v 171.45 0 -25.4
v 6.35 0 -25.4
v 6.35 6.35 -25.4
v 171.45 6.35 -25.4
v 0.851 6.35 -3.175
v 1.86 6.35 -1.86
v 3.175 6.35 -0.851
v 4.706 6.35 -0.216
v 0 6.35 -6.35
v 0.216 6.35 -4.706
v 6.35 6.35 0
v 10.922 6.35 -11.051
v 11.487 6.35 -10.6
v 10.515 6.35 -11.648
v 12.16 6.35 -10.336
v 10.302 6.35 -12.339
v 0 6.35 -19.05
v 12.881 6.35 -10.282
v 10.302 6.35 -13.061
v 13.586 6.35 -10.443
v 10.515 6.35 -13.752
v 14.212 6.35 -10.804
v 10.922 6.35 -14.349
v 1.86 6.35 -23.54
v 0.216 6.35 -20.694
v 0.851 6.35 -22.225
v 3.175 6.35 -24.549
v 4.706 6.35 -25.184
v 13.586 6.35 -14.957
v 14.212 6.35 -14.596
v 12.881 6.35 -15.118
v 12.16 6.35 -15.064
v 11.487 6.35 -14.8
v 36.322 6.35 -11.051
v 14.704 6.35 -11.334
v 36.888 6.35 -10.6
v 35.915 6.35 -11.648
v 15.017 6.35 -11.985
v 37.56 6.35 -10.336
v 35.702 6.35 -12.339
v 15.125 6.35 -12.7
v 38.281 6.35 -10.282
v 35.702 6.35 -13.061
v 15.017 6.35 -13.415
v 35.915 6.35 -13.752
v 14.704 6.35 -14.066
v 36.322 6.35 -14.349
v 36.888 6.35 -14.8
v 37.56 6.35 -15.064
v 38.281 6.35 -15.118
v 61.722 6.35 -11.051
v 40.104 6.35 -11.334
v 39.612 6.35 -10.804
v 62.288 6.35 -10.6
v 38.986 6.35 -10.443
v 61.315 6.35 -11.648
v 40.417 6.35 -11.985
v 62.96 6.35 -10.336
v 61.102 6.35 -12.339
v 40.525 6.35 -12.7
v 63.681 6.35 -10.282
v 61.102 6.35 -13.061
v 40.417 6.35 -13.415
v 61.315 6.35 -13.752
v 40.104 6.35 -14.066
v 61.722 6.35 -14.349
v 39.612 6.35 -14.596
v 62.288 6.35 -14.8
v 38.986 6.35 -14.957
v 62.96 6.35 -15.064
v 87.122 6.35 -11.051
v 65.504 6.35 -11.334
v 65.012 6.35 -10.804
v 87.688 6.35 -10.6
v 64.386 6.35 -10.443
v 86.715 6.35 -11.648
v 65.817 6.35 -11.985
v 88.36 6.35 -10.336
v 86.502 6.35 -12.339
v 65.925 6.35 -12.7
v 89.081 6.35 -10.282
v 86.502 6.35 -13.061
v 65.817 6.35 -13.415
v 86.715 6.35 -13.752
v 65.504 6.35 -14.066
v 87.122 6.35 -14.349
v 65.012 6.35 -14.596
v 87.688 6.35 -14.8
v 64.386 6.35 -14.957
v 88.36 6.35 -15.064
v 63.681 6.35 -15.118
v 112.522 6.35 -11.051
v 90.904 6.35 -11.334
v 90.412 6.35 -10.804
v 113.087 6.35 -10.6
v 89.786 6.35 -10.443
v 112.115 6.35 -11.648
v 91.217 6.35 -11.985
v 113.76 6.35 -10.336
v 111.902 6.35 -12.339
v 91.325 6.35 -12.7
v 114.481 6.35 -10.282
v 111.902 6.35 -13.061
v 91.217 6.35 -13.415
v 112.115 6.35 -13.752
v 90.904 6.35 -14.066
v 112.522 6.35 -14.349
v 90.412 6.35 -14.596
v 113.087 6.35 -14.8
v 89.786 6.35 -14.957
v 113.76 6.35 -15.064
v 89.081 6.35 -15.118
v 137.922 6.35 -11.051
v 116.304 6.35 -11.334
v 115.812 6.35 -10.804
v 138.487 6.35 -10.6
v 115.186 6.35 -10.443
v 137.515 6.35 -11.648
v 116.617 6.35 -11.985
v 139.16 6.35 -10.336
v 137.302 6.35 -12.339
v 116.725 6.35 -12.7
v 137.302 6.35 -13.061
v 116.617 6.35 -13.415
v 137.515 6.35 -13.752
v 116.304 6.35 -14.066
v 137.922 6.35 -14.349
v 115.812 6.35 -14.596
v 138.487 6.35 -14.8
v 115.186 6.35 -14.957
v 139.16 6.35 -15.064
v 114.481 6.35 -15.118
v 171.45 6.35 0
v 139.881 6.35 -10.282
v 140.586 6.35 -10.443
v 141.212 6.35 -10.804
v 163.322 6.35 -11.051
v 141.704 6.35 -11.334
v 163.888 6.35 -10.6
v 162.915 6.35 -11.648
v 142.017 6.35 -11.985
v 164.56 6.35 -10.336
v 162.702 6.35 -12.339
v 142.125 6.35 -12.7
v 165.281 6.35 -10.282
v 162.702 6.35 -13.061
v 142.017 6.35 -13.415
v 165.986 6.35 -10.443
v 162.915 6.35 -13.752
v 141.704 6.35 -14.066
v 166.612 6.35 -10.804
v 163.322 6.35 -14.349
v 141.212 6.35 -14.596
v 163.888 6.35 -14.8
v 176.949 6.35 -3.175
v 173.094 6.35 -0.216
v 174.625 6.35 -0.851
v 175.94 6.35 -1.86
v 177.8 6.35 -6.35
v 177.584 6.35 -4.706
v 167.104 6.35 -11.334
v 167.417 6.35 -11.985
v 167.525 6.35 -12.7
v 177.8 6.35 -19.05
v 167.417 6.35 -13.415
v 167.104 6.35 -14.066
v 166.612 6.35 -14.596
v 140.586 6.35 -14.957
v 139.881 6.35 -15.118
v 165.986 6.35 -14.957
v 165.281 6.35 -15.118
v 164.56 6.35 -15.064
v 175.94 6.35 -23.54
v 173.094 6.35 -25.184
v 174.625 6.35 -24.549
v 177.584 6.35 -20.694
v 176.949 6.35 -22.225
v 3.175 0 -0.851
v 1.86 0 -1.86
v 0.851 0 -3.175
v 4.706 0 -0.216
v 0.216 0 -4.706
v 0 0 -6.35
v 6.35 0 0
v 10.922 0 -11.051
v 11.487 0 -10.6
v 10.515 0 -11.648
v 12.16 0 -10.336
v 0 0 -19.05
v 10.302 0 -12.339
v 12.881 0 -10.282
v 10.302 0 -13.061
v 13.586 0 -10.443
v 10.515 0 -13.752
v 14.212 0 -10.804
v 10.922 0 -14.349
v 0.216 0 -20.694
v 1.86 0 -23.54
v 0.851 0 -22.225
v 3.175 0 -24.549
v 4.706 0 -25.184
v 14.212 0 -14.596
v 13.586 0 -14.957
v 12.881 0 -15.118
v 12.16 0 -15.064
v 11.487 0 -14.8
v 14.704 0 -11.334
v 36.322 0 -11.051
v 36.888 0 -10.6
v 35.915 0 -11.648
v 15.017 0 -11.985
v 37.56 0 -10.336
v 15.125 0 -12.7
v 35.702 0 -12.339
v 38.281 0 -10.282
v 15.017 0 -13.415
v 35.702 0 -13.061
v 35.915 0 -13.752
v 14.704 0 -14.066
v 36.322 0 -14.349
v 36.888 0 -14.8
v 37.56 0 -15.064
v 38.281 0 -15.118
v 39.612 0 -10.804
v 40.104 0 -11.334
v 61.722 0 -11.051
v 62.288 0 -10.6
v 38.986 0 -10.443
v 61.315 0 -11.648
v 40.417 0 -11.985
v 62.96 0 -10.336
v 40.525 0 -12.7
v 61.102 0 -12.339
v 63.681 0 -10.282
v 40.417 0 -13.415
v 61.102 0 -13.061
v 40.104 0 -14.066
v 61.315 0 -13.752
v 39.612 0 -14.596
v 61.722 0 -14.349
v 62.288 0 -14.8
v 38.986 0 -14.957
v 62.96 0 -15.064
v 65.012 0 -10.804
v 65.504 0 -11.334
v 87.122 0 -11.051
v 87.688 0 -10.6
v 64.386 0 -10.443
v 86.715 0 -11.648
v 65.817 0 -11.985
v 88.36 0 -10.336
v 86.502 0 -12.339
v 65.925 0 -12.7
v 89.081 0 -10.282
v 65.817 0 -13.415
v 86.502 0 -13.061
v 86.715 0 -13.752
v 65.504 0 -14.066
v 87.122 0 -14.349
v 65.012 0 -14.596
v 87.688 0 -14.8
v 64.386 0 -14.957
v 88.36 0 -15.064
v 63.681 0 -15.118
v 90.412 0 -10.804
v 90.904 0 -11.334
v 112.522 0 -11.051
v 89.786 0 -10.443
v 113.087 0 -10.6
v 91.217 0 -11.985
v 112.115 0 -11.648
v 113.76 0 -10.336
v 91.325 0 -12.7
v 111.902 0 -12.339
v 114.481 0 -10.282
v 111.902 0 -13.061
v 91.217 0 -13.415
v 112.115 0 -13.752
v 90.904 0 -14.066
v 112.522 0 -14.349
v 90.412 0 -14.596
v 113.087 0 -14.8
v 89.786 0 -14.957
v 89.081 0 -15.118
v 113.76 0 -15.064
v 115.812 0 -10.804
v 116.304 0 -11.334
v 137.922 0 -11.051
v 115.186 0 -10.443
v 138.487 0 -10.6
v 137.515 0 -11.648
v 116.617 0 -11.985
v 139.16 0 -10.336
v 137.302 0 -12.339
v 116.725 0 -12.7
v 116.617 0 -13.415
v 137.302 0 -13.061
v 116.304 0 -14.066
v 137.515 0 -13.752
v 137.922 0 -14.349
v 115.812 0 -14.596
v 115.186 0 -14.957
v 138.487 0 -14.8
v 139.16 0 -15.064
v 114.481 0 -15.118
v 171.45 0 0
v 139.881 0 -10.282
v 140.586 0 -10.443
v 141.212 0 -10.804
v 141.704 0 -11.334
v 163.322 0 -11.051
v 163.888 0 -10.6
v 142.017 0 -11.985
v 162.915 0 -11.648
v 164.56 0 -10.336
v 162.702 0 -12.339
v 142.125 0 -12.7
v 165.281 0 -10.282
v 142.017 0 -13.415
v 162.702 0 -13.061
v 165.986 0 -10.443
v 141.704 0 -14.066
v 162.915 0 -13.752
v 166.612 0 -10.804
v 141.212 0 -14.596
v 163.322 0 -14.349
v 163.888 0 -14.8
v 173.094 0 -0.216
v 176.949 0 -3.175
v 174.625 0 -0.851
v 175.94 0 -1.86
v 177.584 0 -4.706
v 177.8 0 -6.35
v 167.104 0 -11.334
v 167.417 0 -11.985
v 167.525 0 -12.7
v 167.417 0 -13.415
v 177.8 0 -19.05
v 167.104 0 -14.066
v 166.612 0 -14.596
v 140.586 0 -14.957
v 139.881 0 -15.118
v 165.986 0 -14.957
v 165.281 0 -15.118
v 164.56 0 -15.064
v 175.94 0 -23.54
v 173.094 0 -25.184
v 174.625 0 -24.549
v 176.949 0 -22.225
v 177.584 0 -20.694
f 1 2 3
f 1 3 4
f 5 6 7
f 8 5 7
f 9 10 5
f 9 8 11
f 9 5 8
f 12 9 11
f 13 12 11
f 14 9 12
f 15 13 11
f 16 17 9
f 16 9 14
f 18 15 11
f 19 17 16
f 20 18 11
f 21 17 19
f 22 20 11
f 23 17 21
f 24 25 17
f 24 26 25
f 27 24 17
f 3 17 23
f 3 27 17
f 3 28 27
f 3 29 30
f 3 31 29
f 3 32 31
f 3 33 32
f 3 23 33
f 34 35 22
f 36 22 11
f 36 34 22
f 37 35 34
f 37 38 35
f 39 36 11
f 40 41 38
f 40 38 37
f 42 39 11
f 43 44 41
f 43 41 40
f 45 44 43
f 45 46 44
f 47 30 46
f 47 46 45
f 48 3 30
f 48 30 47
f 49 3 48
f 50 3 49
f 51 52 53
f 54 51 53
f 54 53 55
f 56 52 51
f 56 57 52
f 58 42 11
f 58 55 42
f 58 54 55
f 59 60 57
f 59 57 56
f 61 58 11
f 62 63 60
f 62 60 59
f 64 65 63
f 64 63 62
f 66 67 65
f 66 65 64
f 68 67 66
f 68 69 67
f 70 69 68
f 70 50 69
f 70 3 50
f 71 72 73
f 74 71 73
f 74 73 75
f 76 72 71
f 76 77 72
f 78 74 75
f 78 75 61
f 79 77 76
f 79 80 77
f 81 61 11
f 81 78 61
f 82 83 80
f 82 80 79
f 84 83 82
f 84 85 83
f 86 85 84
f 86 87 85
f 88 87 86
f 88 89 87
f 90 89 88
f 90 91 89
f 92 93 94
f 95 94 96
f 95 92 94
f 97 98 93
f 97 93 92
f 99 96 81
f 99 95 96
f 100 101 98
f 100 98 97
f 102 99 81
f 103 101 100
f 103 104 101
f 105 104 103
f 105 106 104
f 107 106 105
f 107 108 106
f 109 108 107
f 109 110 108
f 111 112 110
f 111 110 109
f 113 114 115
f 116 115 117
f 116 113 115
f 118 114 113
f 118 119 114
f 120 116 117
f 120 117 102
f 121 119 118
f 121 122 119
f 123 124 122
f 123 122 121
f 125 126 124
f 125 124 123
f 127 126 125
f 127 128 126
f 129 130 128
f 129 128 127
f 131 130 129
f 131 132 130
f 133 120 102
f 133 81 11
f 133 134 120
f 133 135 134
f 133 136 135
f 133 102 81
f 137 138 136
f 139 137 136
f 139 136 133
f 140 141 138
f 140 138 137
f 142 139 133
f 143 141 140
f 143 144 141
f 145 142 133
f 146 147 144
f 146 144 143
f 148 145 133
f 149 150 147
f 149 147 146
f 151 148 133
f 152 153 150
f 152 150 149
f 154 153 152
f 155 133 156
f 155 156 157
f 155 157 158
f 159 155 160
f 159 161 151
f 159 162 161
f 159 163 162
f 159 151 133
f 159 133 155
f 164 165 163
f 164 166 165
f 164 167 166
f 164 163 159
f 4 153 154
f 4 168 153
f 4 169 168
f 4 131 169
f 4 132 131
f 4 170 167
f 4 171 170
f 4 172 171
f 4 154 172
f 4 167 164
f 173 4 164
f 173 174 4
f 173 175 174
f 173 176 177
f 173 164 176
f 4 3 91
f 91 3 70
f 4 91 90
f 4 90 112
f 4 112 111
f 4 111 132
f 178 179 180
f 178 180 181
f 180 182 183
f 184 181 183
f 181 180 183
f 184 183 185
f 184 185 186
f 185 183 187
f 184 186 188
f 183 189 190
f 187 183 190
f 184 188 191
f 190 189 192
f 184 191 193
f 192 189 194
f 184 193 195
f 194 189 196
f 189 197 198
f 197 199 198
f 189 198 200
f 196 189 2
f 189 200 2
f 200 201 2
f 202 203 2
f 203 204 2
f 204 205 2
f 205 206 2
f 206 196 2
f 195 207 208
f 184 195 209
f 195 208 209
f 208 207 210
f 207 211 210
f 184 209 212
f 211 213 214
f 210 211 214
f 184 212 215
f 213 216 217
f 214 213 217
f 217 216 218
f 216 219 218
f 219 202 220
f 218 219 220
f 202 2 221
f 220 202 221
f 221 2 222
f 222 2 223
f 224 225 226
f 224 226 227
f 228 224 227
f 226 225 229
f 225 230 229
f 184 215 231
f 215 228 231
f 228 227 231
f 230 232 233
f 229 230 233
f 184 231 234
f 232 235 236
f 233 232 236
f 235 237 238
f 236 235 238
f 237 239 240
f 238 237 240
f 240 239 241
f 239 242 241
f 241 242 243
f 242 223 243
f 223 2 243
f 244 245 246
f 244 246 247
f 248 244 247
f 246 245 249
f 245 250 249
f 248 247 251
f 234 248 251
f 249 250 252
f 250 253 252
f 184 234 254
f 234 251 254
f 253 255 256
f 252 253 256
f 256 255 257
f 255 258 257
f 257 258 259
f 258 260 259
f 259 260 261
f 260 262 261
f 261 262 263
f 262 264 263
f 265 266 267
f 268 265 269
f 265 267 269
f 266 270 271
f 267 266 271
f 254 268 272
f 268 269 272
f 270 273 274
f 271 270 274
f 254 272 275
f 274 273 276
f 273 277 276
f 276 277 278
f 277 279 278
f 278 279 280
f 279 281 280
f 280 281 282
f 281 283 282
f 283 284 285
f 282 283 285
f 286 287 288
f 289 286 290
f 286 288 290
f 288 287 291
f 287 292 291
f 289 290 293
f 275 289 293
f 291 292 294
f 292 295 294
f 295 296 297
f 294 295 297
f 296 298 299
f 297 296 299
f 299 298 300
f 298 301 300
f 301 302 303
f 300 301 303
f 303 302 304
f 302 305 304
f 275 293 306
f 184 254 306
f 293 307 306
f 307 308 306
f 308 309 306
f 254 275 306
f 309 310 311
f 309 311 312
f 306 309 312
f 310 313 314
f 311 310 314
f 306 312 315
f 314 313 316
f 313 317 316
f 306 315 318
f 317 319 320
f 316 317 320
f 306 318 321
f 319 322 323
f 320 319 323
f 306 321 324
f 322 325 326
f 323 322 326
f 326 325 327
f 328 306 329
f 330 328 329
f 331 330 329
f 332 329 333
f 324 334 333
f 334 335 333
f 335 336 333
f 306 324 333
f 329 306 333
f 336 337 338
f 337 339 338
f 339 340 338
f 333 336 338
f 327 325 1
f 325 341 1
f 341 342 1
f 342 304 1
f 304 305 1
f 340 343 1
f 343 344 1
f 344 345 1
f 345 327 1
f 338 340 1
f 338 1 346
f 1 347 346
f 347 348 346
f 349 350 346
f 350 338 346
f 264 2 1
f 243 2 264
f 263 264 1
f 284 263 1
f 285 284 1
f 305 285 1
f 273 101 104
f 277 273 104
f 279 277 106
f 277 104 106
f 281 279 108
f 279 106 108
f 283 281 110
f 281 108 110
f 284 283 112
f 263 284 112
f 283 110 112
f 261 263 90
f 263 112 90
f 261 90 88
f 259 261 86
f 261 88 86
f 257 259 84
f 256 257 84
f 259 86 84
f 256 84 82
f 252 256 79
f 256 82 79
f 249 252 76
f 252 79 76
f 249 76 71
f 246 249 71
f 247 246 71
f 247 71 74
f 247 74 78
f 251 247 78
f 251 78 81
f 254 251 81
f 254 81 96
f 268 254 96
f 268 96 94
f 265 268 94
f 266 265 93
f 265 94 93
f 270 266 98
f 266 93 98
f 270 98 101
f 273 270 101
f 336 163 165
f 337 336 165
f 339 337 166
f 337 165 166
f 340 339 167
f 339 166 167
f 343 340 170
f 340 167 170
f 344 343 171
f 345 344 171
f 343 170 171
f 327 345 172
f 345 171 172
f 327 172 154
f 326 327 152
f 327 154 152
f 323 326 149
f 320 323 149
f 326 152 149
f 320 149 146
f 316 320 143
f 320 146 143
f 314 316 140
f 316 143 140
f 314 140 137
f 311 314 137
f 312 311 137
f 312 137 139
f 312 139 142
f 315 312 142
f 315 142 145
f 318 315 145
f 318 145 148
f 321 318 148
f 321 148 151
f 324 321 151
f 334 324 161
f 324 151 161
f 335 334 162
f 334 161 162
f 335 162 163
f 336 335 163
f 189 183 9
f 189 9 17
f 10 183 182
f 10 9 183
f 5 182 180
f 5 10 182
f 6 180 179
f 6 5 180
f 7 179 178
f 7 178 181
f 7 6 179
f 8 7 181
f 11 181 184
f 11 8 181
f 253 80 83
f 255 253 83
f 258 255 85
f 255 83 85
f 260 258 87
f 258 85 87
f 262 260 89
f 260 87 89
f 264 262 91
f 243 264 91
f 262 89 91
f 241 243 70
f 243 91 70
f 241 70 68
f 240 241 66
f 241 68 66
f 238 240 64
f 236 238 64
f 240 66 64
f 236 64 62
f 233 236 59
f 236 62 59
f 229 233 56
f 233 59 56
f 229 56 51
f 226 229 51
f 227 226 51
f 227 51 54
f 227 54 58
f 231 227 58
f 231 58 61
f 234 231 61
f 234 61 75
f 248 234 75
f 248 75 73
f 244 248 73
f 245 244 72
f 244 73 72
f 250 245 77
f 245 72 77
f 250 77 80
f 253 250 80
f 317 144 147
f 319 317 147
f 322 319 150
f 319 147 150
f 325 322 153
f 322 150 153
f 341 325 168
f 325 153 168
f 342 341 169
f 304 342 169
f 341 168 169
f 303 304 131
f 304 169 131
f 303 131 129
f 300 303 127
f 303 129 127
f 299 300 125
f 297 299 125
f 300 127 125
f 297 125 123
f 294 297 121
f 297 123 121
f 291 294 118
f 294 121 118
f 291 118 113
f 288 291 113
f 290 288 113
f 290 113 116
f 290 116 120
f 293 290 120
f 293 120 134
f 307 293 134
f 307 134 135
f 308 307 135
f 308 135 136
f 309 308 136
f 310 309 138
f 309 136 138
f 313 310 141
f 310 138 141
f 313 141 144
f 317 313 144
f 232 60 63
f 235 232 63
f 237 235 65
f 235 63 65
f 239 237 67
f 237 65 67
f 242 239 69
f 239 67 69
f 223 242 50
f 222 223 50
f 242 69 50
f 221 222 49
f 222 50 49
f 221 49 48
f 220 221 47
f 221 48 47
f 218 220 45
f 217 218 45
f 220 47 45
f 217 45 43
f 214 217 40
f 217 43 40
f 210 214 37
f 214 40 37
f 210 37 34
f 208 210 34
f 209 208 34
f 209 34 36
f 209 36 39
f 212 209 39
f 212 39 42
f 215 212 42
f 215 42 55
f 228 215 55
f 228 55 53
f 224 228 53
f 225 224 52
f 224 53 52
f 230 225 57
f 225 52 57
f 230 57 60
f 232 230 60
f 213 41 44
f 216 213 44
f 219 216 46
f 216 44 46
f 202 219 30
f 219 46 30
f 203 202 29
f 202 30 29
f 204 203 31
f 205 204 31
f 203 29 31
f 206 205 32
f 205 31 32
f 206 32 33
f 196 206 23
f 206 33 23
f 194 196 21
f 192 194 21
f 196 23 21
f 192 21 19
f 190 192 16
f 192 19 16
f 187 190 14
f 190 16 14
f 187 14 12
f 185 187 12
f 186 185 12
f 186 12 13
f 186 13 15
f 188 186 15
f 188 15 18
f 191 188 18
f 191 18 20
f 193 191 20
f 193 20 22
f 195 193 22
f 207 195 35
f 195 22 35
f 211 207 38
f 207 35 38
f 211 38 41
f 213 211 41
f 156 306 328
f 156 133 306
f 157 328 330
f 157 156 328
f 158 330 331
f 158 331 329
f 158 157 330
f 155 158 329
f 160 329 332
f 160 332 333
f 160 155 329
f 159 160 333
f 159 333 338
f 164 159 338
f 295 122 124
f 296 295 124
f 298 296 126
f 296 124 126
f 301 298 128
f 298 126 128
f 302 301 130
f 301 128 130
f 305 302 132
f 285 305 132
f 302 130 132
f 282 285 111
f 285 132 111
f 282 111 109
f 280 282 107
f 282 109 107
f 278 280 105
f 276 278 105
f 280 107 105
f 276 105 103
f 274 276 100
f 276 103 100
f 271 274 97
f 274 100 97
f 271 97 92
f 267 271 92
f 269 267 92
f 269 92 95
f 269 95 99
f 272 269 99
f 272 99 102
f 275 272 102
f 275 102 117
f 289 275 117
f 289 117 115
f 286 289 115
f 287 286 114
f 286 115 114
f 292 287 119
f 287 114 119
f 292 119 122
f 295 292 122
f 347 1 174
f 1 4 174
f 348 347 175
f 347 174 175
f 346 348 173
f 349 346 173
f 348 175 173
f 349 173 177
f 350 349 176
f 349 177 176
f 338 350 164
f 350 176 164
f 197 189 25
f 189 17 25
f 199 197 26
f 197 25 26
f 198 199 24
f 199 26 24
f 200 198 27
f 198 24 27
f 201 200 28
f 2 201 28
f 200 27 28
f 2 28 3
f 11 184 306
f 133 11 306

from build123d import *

# Parameters (mm, degrees)
SKETCH1_W           = 177.8
SKETCH1_H           = 25.4
BOSS_EXTRUDE1_DEPTH = 6.35
SKETCH2_R           = 2.425
CUT_EXTRUDE1_DEPTH  = 6.35
FILLET1_R           = 6.35


with BuildPart() as part:
    # Sketch1 → Boss-Extrude1 (new body)
    with BuildSketch(Plane(origin=(0, 0, 0), x_dir=(1, 0, 0), z_dir=(0, 1, 0))):
        with Locations((88.9, 12.7)):
            Rectangle(SKETCH1_W, SKETCH1_H)
    extrude(amount=BOSS_EXTRUDE1_DEPTH)

    # Sketch2 → Cut-Extrude1 (cut)
    with BuildSketch(Plane(origin=(0, 6.35, 0), x_dir=(1, 0, 0), z_dir=(0, 1, 0))):
        with Locations((12.7, 12.7)):
            Circle(SKETCH2_R)
        with Locations((38.1, 12.7)):
            Circle(SKETCH2_R)
        with Locations((63.5, 12.7)):
            Circle(SKETCH2_R)
        with Locations((88.9, 12.7)):
            Circle(SKETCH2_R)
        with Locations((114.3, 12.7)):
            Circle(SKETCH2_R)
        with Locations((139.7, 12.7)):
            Circle(SKETCH2_R)
        with Locations((165.1, 12.7)):
            Circle(SKETCH2_R)
    extrude(amount=-CUT_EXTRUDE1_DEPTH, mode=Mode.SUBTRACT)

    # Fillet1
    fillet1_edges = [part.edges().sort_by_distance(p)[0] for p in [
        (0, 3.175, -25.4),
        (177.8, 3.175, -25.4),
        (177.8, 3.175, 0),
        (0, 3.175, 0),
    ]]
    fillet(fillet1_edges, radius=FILLET1_R)


solid = part.part
